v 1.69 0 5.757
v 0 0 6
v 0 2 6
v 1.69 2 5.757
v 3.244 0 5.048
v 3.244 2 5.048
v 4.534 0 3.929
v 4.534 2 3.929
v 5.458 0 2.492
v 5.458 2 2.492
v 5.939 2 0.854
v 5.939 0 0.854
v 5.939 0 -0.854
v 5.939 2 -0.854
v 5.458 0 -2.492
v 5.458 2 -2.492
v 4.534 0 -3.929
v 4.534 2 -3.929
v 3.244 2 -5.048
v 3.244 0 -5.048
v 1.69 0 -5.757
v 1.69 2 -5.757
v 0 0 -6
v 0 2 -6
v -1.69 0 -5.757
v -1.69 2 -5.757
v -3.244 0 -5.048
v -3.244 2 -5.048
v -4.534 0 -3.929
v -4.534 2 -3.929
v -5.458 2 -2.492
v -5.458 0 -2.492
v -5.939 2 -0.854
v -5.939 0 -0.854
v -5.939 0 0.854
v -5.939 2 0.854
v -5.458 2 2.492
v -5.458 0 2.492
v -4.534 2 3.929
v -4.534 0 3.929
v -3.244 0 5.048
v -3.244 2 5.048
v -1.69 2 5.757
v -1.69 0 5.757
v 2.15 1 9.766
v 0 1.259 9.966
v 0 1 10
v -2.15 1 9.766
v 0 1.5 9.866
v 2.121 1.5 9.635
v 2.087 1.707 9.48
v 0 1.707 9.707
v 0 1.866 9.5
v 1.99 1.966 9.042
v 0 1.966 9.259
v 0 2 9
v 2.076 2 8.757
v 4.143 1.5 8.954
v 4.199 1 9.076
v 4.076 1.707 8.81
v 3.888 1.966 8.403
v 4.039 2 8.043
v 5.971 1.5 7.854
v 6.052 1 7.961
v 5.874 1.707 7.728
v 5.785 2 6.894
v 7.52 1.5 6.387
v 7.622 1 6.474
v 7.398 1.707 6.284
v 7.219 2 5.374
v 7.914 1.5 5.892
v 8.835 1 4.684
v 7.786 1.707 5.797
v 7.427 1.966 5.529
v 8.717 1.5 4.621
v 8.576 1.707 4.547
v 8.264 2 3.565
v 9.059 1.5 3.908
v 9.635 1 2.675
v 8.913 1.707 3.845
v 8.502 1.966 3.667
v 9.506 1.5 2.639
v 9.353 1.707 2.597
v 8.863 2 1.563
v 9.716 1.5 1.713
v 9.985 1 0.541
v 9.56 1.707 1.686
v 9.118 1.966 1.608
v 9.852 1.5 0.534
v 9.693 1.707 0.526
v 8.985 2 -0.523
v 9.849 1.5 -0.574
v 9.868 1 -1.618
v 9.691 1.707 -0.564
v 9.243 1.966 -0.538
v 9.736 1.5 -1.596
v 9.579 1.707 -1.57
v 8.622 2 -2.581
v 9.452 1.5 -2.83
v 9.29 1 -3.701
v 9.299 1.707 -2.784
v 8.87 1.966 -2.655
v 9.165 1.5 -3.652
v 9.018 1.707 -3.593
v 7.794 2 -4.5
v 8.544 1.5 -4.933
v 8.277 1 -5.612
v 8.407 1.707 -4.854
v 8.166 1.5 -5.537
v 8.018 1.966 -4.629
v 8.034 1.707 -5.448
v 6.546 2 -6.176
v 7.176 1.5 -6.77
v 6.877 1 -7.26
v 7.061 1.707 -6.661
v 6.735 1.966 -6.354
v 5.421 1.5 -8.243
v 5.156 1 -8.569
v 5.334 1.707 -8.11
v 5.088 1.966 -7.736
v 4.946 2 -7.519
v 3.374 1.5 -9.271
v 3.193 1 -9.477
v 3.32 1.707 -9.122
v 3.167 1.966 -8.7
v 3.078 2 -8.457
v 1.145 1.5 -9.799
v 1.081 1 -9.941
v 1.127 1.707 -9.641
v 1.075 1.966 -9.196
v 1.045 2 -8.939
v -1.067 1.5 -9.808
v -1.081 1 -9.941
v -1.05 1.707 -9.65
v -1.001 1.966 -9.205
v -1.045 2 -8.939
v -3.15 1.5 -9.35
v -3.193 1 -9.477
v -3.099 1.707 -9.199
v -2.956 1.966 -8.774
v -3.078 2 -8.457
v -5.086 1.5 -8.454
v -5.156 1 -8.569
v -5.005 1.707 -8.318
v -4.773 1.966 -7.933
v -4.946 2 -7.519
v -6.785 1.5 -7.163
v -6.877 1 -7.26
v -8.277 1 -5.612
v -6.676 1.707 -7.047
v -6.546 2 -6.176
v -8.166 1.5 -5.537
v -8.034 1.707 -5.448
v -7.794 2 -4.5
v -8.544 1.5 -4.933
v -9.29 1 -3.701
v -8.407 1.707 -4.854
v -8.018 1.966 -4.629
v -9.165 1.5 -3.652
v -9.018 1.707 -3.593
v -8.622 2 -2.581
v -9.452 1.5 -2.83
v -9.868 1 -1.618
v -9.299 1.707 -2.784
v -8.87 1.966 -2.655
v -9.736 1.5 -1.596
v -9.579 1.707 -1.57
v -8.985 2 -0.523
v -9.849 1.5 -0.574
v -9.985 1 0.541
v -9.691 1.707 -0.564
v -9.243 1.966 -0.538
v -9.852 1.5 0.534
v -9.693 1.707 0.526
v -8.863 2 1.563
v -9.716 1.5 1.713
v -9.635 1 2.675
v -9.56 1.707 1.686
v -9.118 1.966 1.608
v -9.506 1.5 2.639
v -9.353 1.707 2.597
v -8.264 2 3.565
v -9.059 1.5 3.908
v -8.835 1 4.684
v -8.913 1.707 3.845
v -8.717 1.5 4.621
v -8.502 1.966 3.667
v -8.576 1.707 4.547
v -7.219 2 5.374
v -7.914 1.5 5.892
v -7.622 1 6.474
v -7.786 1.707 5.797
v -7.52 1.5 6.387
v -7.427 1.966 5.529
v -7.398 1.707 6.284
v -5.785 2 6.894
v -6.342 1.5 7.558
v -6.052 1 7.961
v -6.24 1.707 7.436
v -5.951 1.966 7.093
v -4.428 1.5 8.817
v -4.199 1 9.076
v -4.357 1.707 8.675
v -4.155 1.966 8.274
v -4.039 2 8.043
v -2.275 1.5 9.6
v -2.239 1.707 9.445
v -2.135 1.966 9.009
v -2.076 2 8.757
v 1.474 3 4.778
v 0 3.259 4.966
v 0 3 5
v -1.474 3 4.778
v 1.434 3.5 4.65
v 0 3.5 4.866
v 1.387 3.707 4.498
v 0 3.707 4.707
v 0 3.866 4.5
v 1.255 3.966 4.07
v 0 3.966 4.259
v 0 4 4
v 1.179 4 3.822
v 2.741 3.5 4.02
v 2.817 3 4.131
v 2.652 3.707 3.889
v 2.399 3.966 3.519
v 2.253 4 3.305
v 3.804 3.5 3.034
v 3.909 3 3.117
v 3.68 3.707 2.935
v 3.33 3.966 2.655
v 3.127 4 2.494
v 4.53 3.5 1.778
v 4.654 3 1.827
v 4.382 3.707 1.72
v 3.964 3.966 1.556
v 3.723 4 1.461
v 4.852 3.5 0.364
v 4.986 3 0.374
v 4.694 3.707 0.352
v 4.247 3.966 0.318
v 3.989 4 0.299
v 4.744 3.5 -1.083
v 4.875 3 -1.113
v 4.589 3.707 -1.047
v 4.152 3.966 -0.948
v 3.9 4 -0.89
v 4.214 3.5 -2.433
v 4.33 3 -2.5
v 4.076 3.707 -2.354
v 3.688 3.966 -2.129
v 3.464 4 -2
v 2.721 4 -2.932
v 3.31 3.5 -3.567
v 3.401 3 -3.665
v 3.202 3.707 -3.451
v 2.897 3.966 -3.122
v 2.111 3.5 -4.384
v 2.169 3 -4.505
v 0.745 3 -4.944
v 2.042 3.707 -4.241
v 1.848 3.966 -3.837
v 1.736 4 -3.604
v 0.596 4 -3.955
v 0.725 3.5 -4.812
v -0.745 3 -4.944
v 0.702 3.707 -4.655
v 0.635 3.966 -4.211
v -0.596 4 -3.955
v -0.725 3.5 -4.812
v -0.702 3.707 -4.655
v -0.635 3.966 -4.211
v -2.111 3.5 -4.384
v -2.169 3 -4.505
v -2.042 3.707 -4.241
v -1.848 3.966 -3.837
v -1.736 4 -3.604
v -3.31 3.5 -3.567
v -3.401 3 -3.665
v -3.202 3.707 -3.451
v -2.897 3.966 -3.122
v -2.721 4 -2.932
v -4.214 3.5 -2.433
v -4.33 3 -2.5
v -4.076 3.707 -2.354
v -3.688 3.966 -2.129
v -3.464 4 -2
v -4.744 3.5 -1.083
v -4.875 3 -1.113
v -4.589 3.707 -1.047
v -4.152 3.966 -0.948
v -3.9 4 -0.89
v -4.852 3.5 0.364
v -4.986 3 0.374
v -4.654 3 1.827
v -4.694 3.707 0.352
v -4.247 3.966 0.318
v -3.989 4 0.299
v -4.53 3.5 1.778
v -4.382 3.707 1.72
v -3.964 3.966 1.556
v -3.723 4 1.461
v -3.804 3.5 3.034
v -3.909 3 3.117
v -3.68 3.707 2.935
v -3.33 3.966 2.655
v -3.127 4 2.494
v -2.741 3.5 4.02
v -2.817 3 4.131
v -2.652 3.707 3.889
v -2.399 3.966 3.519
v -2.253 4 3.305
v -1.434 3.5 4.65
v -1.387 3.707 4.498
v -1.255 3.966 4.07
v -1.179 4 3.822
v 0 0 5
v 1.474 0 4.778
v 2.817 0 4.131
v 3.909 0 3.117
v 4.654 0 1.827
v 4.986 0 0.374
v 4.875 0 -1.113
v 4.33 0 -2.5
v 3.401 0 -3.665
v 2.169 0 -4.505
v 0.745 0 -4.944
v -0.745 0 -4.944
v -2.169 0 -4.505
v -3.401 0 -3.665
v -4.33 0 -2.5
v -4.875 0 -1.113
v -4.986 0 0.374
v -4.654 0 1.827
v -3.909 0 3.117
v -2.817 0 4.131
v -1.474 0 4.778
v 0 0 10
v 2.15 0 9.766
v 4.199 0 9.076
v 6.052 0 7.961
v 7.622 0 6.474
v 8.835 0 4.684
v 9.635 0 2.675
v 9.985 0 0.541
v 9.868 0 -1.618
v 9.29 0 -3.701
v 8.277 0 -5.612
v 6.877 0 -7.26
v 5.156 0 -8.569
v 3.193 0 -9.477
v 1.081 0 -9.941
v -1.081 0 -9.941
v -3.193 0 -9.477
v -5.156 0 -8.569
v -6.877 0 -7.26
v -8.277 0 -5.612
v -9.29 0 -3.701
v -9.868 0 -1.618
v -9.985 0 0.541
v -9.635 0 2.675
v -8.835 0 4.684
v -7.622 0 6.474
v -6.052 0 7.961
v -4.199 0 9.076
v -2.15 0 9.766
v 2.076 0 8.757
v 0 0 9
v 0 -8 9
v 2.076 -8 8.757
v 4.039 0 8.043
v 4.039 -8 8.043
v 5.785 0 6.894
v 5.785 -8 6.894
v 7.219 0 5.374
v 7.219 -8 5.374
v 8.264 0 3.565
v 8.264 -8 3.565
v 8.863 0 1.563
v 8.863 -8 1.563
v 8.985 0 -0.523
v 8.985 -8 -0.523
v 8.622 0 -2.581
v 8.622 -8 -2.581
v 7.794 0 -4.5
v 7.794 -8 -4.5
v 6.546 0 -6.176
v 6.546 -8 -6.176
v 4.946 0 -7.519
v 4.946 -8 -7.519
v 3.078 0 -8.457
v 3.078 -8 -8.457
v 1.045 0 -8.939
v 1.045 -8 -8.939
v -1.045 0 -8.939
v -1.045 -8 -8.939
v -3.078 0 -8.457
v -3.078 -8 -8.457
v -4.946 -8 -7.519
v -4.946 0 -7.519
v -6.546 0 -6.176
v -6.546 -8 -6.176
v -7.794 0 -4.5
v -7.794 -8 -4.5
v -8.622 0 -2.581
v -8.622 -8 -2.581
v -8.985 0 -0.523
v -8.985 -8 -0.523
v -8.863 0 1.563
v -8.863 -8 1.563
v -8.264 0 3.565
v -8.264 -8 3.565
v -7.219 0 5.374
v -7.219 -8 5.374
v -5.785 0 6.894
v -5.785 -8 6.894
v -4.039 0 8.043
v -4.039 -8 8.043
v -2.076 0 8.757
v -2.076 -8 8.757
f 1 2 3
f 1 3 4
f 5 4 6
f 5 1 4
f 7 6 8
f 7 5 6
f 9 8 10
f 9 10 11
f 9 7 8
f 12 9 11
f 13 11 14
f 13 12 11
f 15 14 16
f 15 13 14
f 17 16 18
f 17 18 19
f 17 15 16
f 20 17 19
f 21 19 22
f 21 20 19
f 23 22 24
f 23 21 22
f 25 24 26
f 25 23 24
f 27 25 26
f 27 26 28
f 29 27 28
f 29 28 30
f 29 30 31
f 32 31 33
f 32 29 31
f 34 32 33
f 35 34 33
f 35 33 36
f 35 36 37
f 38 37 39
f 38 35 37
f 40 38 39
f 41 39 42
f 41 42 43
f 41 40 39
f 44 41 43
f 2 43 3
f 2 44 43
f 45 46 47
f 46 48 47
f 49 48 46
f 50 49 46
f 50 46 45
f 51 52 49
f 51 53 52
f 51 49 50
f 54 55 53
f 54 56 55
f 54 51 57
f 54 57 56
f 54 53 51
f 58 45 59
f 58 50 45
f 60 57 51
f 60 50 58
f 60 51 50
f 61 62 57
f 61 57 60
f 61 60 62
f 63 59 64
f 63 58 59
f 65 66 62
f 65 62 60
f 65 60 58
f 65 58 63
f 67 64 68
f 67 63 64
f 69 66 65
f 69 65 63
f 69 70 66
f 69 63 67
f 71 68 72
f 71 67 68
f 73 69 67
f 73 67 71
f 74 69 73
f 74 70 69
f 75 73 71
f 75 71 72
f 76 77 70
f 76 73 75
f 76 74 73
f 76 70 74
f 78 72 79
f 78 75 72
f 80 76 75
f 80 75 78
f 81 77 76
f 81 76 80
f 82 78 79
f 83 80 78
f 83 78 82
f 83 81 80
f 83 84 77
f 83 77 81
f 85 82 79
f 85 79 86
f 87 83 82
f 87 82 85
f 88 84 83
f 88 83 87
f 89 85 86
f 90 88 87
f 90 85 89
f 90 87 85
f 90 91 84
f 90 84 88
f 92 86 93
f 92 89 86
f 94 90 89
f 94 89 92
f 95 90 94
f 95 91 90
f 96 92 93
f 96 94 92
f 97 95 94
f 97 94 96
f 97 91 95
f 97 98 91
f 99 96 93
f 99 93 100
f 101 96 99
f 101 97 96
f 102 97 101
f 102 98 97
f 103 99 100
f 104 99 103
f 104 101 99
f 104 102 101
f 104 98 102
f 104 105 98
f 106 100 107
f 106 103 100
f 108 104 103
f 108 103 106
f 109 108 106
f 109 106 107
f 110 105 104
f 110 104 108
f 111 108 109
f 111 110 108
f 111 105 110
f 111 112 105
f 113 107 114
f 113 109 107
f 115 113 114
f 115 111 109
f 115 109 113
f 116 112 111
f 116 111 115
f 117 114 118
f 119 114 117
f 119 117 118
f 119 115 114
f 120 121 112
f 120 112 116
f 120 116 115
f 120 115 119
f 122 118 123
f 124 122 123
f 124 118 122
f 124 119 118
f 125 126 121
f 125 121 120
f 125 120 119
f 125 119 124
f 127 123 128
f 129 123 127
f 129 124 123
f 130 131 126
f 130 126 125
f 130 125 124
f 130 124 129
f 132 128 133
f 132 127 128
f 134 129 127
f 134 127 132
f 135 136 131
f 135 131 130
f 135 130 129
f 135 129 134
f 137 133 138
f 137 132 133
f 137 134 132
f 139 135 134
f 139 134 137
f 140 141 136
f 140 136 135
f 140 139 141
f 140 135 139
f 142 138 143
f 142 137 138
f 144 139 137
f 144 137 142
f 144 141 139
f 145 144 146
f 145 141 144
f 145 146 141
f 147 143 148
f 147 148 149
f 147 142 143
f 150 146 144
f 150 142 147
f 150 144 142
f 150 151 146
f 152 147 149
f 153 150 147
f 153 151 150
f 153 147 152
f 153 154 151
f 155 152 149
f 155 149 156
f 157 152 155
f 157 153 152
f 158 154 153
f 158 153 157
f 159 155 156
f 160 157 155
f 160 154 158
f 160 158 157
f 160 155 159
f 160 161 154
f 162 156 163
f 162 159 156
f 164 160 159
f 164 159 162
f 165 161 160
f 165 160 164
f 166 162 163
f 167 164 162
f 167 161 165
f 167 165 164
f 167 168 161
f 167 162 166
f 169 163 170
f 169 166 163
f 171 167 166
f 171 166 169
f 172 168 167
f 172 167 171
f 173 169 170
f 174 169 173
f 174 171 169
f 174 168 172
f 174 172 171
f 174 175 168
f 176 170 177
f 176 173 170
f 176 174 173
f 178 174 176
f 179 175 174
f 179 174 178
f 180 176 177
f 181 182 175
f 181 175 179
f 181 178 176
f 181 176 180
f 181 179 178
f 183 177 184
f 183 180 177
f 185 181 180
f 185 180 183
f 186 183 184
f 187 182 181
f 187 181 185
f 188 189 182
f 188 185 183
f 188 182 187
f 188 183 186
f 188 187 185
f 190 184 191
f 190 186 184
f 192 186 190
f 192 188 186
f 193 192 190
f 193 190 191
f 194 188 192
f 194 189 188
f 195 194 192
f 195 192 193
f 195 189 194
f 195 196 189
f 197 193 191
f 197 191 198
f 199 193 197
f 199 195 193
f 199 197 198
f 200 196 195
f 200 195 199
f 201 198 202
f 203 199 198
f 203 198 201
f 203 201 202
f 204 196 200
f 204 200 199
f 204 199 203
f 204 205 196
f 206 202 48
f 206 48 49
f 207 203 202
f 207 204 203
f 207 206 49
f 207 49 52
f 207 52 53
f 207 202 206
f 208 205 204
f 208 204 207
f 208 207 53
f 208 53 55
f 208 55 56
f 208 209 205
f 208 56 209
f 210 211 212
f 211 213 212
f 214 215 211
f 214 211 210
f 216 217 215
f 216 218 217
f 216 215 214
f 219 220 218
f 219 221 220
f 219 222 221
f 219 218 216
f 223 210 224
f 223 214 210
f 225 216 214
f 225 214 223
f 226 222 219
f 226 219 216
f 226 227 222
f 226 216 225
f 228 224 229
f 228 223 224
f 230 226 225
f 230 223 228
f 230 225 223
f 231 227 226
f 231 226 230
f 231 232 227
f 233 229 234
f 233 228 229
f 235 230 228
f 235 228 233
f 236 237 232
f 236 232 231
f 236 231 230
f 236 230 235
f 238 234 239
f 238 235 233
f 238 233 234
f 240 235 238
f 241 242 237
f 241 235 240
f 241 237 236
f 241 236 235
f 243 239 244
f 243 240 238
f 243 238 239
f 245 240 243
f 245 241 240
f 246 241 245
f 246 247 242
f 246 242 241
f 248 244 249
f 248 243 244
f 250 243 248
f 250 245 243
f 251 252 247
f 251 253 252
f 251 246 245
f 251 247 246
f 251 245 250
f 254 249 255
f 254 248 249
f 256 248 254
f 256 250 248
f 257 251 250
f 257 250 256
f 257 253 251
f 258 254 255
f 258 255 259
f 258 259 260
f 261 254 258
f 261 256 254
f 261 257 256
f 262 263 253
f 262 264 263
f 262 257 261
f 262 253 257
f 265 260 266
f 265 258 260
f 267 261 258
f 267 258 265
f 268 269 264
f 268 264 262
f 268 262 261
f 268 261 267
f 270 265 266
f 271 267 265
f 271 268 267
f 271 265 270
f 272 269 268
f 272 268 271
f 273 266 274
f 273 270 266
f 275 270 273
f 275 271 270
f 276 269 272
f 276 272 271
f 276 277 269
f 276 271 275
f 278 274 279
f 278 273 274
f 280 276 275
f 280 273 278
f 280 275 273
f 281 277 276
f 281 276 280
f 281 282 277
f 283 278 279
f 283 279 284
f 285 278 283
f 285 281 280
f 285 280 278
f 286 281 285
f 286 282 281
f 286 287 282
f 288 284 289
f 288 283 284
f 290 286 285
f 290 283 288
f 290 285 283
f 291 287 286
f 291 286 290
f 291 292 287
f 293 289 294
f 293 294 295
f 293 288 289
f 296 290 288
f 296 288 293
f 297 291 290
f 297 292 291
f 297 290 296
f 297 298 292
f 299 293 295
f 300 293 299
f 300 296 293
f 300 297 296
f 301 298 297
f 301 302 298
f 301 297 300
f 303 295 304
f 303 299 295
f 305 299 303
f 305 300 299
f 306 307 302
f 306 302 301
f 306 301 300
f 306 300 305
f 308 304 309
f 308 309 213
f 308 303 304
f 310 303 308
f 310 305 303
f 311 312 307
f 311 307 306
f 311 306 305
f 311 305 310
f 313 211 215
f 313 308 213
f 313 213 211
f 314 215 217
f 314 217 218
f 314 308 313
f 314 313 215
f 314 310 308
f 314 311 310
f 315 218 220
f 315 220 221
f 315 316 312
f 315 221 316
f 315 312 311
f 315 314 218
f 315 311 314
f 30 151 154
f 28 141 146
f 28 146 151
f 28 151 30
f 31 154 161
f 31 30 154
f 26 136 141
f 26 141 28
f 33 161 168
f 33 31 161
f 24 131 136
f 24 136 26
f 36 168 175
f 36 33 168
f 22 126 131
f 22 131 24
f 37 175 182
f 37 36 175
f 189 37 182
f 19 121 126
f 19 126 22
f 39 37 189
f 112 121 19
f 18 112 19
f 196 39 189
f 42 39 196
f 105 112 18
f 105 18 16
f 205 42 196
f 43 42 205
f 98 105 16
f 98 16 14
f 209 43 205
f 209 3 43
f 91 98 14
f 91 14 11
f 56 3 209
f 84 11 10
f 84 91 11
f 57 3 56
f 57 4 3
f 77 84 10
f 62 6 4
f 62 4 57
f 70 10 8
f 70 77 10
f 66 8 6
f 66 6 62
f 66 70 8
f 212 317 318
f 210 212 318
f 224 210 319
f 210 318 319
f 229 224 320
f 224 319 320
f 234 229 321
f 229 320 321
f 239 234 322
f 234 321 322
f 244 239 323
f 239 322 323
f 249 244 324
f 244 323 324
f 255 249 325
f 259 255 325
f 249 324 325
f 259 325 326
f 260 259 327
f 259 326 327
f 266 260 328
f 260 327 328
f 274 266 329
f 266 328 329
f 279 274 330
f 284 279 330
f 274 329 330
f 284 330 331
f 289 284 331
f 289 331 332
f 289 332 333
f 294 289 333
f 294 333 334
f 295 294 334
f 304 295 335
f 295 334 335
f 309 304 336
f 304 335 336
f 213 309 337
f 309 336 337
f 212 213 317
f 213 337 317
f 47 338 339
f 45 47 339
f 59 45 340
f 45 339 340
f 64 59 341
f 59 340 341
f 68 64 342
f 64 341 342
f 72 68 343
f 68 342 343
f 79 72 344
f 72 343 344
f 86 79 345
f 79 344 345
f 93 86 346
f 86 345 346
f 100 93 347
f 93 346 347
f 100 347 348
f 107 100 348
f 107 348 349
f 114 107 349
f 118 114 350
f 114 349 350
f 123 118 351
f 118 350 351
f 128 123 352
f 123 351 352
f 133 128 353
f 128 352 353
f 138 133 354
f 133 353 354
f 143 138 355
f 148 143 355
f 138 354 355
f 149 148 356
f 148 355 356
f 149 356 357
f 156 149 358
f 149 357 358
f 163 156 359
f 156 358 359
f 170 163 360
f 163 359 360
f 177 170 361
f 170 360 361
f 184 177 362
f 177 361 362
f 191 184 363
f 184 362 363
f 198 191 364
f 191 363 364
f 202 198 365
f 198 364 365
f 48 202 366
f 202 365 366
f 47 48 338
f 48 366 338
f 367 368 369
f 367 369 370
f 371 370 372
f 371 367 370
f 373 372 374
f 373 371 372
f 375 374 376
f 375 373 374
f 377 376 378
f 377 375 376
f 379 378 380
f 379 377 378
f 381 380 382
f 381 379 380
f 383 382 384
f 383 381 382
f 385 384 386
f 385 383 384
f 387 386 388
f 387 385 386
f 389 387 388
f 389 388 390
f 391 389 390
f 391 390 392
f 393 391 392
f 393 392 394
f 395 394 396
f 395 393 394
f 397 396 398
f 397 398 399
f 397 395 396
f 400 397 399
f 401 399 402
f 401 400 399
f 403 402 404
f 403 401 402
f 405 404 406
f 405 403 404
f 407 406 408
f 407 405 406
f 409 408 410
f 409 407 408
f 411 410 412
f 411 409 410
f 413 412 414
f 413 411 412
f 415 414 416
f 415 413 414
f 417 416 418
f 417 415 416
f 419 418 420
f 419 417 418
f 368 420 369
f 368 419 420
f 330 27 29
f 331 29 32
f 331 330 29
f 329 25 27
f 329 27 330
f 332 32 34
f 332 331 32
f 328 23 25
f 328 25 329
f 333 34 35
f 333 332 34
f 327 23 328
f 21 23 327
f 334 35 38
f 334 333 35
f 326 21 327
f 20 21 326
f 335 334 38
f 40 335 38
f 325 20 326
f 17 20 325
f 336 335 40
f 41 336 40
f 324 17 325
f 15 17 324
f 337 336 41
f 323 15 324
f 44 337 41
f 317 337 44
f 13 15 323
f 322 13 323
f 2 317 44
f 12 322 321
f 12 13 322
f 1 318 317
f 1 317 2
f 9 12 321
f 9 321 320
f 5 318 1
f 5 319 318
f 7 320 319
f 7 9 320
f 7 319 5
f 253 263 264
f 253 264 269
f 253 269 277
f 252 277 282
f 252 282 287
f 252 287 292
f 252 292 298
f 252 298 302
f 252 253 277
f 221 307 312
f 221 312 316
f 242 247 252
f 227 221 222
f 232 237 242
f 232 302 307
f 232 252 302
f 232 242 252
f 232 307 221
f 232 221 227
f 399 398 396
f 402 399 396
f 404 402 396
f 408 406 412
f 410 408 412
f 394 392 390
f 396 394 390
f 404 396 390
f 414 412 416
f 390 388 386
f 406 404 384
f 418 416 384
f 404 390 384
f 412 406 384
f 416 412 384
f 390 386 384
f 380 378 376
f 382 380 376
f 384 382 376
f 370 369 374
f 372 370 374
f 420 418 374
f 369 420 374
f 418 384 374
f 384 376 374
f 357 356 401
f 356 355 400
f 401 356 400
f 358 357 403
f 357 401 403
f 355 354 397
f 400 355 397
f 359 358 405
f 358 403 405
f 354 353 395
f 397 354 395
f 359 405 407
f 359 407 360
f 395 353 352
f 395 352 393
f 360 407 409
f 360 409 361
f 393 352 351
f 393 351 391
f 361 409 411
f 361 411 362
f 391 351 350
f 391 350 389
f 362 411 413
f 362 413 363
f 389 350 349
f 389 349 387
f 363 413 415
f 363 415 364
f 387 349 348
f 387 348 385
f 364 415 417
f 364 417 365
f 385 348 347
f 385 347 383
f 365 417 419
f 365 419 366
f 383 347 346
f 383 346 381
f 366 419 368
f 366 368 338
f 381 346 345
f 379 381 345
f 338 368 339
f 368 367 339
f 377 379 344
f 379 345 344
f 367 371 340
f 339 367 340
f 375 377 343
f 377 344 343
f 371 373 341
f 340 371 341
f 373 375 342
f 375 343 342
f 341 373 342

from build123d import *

# Parameters (mm, degrees)
SKETCH1_R           = 10
SKETCH1_R_2         = 6
BOSS_EXTRUDE1_DEPTH = 2
SKETCH2_R           = 9
BOSS_EXTRUDE2_DEPTH = 8
SKETCH3_R           = 5
BOSS_EXTRUDE3_DEPTH = 4
FILLET1_R           = 1


with BuildPart() as part:
    # Sketch1 → Boss-Extrude1 (new body)
    with BuildSketch(Plane(origin=(0, 0, 0), x_dir=(1, 0, 0), z_dir=(0, 1, 0))):
        with Locations(Location((0, 0, 0), (0, 0, 270))):
            Circle(SKETCH1_R)
        with Locations(Location((0, 0, 0), (0, 0, 270))):
            Circle(SKETCH1_R_2, mode=Mode.SUBTRACT)
    extrude(amount=BOSS_EXTRUDE1_DEPTH)

    # Sketch2 → Boss-Extrude2 (add)
    with BuildSketch(Plane(origin=(0, 0, 0), x_dir=(1, 0, 0), z_dir=(0, 1, 0))):
        with Locations(Location((0, 0, 0), (0, 0, 270))):
            Circle(SKETCH2_R)
    extrude(amount=-BOSS_EXTRUDE2_DEPTH)

    # Sketch3 → Boss-Extrude3 (add)
    with BuildSketch(Plane(origin=(0, 0, 0), x_dir=(1, 0, 0), z_dir=(0, 1, 0))):
        with Locations(Location((0, 0, 0), (0, 0, 270))):
            Circle(SKETCH3_R)
    extrude(amount=BOSS_EXTRUDE3_DEPTH)

    # Fillet1
    fillet1_edges = [part.edges().sort_by_distance(p)[0] for p in [
        (0, 4, -5),
        (0, 2, -10),
    ]]
    fillet(fillet1_edges, radius=FILLET1_R)


solid = part.part
